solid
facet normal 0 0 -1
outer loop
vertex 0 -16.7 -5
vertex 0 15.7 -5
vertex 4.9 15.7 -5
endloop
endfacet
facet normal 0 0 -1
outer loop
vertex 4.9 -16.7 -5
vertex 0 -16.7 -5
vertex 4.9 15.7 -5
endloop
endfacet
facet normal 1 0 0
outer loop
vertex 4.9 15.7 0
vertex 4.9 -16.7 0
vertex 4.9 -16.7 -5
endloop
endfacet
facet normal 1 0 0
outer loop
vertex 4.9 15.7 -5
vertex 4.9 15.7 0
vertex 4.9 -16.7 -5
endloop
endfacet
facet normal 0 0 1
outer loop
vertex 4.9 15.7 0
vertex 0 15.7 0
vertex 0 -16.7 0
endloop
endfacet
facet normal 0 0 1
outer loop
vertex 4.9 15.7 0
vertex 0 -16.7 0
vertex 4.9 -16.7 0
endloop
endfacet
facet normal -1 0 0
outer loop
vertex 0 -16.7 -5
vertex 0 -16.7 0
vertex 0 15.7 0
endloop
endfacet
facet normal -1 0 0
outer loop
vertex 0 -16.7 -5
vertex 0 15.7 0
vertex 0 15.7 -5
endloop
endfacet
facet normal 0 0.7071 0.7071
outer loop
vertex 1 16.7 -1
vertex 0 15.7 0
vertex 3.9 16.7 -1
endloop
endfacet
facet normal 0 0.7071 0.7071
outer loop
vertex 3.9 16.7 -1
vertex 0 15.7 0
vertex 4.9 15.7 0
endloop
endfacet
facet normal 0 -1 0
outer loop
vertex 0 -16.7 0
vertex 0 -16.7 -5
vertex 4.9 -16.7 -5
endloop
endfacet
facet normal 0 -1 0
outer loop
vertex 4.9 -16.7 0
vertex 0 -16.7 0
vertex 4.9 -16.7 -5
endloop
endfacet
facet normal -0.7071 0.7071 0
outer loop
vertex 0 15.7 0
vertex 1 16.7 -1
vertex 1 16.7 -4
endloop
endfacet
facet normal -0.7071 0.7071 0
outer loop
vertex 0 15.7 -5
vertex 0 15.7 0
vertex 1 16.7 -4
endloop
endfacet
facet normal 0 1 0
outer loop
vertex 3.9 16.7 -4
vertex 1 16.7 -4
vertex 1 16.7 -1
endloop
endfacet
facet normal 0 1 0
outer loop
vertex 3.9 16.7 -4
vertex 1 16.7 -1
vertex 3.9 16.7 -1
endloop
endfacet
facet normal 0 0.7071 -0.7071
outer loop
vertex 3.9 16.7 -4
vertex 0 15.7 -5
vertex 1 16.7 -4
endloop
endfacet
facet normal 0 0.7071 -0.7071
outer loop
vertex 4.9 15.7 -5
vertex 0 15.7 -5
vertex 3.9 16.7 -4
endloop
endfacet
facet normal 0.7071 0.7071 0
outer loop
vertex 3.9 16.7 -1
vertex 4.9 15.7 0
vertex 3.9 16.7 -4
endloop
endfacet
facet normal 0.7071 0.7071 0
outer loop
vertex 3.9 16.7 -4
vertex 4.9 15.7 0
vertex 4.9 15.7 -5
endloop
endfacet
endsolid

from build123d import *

# Parameters (mm, degrees)
SKETCH1_W           = 4.9
SKETCH1_H           = 5
BOSS_EXTRUDE1_DEPTH = 16.7
CHAMFER1_SIZE       = 1


with BuildPart() as part:
    # Sketch1 → Boss-Extrude1 (new, symmetric)
    with BuildSketch(Plane(origin=(0, 0, 0), x_dir=(1, 0, 0), z_dir=(0, 1, 0))):
        with Locations((2.45, 2.5)):
            Rectangle(SKETCH1_W, SKETCH1_H)
    extrude(amount=BOSS_EXTRUDE1_DEPTH, both=True)

    # Chamfer1
    chamfer1_edges = [part.edges().sort_by_distance(p)[0] for p in [
        (4.9, 16.7, -2.5),
        (2.45, 16.7, -5),
        (0, 16.7, -2.5),
        (2.45, 16.7, 0),
    ]]
    chamfer(chamfer1_edges, length=CHAMFER1_SIZE)


solid = part.part
